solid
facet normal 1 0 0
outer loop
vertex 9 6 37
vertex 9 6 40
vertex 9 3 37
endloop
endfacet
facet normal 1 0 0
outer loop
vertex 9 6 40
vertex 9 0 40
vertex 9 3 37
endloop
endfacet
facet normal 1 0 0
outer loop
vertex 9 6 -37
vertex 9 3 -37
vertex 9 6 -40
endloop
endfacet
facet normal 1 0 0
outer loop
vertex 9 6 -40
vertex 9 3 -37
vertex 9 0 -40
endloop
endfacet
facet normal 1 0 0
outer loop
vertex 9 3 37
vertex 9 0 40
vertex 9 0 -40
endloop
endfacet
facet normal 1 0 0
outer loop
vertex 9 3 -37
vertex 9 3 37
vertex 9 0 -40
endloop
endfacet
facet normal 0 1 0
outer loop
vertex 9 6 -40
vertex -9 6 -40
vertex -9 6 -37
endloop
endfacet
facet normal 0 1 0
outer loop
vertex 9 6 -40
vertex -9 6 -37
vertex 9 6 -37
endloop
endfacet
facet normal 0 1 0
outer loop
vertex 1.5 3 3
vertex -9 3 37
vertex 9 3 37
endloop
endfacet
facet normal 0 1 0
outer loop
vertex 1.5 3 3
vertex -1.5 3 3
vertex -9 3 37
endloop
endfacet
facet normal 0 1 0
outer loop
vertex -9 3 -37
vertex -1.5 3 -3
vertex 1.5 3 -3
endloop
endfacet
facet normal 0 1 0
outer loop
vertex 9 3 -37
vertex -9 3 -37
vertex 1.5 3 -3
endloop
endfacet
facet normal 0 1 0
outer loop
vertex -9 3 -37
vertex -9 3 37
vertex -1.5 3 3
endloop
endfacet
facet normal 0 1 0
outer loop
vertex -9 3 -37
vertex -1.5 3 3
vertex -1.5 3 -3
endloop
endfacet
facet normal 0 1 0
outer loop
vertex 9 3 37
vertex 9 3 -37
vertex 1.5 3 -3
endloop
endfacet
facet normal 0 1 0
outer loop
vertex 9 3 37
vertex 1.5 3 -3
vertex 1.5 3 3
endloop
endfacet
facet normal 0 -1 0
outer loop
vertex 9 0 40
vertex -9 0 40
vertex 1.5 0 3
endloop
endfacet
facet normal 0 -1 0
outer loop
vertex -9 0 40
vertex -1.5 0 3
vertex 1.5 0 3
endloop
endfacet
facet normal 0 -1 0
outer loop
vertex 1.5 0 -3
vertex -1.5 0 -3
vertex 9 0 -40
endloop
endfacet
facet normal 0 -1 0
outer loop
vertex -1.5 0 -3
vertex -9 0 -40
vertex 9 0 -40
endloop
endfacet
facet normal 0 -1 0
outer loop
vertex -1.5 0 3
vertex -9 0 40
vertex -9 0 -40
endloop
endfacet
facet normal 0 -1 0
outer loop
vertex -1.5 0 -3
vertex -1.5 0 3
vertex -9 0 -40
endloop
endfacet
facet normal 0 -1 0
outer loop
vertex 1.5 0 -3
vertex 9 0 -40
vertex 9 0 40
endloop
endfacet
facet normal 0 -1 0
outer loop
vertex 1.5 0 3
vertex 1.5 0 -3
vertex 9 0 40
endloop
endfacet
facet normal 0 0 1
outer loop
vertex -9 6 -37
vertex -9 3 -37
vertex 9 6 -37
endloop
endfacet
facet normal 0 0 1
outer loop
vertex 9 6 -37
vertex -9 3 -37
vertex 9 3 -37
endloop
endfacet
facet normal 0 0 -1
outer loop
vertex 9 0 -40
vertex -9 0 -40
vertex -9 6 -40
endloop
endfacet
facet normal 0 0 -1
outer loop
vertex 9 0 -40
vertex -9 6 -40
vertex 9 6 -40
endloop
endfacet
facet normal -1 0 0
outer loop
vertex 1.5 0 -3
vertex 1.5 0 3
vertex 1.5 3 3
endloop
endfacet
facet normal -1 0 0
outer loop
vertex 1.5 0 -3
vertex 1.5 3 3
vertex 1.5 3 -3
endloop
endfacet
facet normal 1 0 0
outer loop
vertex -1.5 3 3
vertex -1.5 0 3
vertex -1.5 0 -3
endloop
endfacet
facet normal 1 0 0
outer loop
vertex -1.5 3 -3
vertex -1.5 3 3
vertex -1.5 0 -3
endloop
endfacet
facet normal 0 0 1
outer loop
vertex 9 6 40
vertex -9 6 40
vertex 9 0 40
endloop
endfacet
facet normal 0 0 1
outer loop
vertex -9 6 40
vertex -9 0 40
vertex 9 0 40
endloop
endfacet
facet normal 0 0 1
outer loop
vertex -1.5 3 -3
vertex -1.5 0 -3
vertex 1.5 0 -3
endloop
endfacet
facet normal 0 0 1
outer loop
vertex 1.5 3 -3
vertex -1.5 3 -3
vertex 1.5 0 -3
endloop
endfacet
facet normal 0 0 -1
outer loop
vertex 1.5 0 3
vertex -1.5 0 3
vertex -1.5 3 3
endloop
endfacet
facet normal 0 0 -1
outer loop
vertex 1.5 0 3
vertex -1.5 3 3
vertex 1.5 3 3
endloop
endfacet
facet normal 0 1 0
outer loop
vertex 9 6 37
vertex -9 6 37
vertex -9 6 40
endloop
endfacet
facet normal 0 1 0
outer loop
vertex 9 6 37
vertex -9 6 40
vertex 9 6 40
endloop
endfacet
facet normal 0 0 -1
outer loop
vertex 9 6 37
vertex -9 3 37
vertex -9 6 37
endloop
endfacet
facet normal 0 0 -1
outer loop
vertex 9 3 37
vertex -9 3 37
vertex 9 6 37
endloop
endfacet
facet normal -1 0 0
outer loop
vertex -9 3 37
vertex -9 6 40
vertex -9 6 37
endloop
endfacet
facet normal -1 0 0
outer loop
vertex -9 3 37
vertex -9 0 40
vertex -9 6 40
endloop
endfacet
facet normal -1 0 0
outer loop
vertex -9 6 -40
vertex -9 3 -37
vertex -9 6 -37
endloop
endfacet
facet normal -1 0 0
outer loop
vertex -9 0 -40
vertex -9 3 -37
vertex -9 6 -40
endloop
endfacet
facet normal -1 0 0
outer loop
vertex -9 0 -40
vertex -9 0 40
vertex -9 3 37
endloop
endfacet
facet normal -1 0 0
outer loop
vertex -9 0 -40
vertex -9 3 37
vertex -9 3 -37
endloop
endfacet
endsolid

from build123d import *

# Parameters (mm, degrees)
SKETCH1_W           = 18
SKETCH1_H           = 80
SKETCH1_W_2         = 3
SKETCH1_H_2         = 6
BOSS_EXTRUDE1_DEPTH = 3
SKETCH2_W           = 18
SKETCH2_H           = 3
BOSS_EXTRUDE2_DEPTH = 3


with BuildPart() as part:
    # Sketch1 → Boss-Extrude1 (new body)
    with BuildSketch(Plane(origin=(0, 0, 0), x_dir=(1, 0, 0), z_dir=(0, 1, 0))):
        Rectangle(SKETCH1_W, SKETCH1_H)
        Rectangle(SKETCH1_W_2, SKETCH1_H_2, mode=Mode.SUBTRACT)
    extrude(amount=BOSS_EXTRUDE1_DEPTH)

    # Sketch2 → Boss-Extrude2 (add)
    with BuildSketch(Plane(origin=(0, 3, 0), x_dir=(1, 0, 0), z_dir=(0, 1, 0))):
        with Locations((0, -38.5)):
            Rectangle(SKETCH2_W, SKETCH2_H)
        with Locations((0, 38.5)):
            Rectangle(SKETCH2_W, SKETCH2_H)
    extrude(amount=BOSS_EXTRUDE2_DEPTH)


solid = part.part
